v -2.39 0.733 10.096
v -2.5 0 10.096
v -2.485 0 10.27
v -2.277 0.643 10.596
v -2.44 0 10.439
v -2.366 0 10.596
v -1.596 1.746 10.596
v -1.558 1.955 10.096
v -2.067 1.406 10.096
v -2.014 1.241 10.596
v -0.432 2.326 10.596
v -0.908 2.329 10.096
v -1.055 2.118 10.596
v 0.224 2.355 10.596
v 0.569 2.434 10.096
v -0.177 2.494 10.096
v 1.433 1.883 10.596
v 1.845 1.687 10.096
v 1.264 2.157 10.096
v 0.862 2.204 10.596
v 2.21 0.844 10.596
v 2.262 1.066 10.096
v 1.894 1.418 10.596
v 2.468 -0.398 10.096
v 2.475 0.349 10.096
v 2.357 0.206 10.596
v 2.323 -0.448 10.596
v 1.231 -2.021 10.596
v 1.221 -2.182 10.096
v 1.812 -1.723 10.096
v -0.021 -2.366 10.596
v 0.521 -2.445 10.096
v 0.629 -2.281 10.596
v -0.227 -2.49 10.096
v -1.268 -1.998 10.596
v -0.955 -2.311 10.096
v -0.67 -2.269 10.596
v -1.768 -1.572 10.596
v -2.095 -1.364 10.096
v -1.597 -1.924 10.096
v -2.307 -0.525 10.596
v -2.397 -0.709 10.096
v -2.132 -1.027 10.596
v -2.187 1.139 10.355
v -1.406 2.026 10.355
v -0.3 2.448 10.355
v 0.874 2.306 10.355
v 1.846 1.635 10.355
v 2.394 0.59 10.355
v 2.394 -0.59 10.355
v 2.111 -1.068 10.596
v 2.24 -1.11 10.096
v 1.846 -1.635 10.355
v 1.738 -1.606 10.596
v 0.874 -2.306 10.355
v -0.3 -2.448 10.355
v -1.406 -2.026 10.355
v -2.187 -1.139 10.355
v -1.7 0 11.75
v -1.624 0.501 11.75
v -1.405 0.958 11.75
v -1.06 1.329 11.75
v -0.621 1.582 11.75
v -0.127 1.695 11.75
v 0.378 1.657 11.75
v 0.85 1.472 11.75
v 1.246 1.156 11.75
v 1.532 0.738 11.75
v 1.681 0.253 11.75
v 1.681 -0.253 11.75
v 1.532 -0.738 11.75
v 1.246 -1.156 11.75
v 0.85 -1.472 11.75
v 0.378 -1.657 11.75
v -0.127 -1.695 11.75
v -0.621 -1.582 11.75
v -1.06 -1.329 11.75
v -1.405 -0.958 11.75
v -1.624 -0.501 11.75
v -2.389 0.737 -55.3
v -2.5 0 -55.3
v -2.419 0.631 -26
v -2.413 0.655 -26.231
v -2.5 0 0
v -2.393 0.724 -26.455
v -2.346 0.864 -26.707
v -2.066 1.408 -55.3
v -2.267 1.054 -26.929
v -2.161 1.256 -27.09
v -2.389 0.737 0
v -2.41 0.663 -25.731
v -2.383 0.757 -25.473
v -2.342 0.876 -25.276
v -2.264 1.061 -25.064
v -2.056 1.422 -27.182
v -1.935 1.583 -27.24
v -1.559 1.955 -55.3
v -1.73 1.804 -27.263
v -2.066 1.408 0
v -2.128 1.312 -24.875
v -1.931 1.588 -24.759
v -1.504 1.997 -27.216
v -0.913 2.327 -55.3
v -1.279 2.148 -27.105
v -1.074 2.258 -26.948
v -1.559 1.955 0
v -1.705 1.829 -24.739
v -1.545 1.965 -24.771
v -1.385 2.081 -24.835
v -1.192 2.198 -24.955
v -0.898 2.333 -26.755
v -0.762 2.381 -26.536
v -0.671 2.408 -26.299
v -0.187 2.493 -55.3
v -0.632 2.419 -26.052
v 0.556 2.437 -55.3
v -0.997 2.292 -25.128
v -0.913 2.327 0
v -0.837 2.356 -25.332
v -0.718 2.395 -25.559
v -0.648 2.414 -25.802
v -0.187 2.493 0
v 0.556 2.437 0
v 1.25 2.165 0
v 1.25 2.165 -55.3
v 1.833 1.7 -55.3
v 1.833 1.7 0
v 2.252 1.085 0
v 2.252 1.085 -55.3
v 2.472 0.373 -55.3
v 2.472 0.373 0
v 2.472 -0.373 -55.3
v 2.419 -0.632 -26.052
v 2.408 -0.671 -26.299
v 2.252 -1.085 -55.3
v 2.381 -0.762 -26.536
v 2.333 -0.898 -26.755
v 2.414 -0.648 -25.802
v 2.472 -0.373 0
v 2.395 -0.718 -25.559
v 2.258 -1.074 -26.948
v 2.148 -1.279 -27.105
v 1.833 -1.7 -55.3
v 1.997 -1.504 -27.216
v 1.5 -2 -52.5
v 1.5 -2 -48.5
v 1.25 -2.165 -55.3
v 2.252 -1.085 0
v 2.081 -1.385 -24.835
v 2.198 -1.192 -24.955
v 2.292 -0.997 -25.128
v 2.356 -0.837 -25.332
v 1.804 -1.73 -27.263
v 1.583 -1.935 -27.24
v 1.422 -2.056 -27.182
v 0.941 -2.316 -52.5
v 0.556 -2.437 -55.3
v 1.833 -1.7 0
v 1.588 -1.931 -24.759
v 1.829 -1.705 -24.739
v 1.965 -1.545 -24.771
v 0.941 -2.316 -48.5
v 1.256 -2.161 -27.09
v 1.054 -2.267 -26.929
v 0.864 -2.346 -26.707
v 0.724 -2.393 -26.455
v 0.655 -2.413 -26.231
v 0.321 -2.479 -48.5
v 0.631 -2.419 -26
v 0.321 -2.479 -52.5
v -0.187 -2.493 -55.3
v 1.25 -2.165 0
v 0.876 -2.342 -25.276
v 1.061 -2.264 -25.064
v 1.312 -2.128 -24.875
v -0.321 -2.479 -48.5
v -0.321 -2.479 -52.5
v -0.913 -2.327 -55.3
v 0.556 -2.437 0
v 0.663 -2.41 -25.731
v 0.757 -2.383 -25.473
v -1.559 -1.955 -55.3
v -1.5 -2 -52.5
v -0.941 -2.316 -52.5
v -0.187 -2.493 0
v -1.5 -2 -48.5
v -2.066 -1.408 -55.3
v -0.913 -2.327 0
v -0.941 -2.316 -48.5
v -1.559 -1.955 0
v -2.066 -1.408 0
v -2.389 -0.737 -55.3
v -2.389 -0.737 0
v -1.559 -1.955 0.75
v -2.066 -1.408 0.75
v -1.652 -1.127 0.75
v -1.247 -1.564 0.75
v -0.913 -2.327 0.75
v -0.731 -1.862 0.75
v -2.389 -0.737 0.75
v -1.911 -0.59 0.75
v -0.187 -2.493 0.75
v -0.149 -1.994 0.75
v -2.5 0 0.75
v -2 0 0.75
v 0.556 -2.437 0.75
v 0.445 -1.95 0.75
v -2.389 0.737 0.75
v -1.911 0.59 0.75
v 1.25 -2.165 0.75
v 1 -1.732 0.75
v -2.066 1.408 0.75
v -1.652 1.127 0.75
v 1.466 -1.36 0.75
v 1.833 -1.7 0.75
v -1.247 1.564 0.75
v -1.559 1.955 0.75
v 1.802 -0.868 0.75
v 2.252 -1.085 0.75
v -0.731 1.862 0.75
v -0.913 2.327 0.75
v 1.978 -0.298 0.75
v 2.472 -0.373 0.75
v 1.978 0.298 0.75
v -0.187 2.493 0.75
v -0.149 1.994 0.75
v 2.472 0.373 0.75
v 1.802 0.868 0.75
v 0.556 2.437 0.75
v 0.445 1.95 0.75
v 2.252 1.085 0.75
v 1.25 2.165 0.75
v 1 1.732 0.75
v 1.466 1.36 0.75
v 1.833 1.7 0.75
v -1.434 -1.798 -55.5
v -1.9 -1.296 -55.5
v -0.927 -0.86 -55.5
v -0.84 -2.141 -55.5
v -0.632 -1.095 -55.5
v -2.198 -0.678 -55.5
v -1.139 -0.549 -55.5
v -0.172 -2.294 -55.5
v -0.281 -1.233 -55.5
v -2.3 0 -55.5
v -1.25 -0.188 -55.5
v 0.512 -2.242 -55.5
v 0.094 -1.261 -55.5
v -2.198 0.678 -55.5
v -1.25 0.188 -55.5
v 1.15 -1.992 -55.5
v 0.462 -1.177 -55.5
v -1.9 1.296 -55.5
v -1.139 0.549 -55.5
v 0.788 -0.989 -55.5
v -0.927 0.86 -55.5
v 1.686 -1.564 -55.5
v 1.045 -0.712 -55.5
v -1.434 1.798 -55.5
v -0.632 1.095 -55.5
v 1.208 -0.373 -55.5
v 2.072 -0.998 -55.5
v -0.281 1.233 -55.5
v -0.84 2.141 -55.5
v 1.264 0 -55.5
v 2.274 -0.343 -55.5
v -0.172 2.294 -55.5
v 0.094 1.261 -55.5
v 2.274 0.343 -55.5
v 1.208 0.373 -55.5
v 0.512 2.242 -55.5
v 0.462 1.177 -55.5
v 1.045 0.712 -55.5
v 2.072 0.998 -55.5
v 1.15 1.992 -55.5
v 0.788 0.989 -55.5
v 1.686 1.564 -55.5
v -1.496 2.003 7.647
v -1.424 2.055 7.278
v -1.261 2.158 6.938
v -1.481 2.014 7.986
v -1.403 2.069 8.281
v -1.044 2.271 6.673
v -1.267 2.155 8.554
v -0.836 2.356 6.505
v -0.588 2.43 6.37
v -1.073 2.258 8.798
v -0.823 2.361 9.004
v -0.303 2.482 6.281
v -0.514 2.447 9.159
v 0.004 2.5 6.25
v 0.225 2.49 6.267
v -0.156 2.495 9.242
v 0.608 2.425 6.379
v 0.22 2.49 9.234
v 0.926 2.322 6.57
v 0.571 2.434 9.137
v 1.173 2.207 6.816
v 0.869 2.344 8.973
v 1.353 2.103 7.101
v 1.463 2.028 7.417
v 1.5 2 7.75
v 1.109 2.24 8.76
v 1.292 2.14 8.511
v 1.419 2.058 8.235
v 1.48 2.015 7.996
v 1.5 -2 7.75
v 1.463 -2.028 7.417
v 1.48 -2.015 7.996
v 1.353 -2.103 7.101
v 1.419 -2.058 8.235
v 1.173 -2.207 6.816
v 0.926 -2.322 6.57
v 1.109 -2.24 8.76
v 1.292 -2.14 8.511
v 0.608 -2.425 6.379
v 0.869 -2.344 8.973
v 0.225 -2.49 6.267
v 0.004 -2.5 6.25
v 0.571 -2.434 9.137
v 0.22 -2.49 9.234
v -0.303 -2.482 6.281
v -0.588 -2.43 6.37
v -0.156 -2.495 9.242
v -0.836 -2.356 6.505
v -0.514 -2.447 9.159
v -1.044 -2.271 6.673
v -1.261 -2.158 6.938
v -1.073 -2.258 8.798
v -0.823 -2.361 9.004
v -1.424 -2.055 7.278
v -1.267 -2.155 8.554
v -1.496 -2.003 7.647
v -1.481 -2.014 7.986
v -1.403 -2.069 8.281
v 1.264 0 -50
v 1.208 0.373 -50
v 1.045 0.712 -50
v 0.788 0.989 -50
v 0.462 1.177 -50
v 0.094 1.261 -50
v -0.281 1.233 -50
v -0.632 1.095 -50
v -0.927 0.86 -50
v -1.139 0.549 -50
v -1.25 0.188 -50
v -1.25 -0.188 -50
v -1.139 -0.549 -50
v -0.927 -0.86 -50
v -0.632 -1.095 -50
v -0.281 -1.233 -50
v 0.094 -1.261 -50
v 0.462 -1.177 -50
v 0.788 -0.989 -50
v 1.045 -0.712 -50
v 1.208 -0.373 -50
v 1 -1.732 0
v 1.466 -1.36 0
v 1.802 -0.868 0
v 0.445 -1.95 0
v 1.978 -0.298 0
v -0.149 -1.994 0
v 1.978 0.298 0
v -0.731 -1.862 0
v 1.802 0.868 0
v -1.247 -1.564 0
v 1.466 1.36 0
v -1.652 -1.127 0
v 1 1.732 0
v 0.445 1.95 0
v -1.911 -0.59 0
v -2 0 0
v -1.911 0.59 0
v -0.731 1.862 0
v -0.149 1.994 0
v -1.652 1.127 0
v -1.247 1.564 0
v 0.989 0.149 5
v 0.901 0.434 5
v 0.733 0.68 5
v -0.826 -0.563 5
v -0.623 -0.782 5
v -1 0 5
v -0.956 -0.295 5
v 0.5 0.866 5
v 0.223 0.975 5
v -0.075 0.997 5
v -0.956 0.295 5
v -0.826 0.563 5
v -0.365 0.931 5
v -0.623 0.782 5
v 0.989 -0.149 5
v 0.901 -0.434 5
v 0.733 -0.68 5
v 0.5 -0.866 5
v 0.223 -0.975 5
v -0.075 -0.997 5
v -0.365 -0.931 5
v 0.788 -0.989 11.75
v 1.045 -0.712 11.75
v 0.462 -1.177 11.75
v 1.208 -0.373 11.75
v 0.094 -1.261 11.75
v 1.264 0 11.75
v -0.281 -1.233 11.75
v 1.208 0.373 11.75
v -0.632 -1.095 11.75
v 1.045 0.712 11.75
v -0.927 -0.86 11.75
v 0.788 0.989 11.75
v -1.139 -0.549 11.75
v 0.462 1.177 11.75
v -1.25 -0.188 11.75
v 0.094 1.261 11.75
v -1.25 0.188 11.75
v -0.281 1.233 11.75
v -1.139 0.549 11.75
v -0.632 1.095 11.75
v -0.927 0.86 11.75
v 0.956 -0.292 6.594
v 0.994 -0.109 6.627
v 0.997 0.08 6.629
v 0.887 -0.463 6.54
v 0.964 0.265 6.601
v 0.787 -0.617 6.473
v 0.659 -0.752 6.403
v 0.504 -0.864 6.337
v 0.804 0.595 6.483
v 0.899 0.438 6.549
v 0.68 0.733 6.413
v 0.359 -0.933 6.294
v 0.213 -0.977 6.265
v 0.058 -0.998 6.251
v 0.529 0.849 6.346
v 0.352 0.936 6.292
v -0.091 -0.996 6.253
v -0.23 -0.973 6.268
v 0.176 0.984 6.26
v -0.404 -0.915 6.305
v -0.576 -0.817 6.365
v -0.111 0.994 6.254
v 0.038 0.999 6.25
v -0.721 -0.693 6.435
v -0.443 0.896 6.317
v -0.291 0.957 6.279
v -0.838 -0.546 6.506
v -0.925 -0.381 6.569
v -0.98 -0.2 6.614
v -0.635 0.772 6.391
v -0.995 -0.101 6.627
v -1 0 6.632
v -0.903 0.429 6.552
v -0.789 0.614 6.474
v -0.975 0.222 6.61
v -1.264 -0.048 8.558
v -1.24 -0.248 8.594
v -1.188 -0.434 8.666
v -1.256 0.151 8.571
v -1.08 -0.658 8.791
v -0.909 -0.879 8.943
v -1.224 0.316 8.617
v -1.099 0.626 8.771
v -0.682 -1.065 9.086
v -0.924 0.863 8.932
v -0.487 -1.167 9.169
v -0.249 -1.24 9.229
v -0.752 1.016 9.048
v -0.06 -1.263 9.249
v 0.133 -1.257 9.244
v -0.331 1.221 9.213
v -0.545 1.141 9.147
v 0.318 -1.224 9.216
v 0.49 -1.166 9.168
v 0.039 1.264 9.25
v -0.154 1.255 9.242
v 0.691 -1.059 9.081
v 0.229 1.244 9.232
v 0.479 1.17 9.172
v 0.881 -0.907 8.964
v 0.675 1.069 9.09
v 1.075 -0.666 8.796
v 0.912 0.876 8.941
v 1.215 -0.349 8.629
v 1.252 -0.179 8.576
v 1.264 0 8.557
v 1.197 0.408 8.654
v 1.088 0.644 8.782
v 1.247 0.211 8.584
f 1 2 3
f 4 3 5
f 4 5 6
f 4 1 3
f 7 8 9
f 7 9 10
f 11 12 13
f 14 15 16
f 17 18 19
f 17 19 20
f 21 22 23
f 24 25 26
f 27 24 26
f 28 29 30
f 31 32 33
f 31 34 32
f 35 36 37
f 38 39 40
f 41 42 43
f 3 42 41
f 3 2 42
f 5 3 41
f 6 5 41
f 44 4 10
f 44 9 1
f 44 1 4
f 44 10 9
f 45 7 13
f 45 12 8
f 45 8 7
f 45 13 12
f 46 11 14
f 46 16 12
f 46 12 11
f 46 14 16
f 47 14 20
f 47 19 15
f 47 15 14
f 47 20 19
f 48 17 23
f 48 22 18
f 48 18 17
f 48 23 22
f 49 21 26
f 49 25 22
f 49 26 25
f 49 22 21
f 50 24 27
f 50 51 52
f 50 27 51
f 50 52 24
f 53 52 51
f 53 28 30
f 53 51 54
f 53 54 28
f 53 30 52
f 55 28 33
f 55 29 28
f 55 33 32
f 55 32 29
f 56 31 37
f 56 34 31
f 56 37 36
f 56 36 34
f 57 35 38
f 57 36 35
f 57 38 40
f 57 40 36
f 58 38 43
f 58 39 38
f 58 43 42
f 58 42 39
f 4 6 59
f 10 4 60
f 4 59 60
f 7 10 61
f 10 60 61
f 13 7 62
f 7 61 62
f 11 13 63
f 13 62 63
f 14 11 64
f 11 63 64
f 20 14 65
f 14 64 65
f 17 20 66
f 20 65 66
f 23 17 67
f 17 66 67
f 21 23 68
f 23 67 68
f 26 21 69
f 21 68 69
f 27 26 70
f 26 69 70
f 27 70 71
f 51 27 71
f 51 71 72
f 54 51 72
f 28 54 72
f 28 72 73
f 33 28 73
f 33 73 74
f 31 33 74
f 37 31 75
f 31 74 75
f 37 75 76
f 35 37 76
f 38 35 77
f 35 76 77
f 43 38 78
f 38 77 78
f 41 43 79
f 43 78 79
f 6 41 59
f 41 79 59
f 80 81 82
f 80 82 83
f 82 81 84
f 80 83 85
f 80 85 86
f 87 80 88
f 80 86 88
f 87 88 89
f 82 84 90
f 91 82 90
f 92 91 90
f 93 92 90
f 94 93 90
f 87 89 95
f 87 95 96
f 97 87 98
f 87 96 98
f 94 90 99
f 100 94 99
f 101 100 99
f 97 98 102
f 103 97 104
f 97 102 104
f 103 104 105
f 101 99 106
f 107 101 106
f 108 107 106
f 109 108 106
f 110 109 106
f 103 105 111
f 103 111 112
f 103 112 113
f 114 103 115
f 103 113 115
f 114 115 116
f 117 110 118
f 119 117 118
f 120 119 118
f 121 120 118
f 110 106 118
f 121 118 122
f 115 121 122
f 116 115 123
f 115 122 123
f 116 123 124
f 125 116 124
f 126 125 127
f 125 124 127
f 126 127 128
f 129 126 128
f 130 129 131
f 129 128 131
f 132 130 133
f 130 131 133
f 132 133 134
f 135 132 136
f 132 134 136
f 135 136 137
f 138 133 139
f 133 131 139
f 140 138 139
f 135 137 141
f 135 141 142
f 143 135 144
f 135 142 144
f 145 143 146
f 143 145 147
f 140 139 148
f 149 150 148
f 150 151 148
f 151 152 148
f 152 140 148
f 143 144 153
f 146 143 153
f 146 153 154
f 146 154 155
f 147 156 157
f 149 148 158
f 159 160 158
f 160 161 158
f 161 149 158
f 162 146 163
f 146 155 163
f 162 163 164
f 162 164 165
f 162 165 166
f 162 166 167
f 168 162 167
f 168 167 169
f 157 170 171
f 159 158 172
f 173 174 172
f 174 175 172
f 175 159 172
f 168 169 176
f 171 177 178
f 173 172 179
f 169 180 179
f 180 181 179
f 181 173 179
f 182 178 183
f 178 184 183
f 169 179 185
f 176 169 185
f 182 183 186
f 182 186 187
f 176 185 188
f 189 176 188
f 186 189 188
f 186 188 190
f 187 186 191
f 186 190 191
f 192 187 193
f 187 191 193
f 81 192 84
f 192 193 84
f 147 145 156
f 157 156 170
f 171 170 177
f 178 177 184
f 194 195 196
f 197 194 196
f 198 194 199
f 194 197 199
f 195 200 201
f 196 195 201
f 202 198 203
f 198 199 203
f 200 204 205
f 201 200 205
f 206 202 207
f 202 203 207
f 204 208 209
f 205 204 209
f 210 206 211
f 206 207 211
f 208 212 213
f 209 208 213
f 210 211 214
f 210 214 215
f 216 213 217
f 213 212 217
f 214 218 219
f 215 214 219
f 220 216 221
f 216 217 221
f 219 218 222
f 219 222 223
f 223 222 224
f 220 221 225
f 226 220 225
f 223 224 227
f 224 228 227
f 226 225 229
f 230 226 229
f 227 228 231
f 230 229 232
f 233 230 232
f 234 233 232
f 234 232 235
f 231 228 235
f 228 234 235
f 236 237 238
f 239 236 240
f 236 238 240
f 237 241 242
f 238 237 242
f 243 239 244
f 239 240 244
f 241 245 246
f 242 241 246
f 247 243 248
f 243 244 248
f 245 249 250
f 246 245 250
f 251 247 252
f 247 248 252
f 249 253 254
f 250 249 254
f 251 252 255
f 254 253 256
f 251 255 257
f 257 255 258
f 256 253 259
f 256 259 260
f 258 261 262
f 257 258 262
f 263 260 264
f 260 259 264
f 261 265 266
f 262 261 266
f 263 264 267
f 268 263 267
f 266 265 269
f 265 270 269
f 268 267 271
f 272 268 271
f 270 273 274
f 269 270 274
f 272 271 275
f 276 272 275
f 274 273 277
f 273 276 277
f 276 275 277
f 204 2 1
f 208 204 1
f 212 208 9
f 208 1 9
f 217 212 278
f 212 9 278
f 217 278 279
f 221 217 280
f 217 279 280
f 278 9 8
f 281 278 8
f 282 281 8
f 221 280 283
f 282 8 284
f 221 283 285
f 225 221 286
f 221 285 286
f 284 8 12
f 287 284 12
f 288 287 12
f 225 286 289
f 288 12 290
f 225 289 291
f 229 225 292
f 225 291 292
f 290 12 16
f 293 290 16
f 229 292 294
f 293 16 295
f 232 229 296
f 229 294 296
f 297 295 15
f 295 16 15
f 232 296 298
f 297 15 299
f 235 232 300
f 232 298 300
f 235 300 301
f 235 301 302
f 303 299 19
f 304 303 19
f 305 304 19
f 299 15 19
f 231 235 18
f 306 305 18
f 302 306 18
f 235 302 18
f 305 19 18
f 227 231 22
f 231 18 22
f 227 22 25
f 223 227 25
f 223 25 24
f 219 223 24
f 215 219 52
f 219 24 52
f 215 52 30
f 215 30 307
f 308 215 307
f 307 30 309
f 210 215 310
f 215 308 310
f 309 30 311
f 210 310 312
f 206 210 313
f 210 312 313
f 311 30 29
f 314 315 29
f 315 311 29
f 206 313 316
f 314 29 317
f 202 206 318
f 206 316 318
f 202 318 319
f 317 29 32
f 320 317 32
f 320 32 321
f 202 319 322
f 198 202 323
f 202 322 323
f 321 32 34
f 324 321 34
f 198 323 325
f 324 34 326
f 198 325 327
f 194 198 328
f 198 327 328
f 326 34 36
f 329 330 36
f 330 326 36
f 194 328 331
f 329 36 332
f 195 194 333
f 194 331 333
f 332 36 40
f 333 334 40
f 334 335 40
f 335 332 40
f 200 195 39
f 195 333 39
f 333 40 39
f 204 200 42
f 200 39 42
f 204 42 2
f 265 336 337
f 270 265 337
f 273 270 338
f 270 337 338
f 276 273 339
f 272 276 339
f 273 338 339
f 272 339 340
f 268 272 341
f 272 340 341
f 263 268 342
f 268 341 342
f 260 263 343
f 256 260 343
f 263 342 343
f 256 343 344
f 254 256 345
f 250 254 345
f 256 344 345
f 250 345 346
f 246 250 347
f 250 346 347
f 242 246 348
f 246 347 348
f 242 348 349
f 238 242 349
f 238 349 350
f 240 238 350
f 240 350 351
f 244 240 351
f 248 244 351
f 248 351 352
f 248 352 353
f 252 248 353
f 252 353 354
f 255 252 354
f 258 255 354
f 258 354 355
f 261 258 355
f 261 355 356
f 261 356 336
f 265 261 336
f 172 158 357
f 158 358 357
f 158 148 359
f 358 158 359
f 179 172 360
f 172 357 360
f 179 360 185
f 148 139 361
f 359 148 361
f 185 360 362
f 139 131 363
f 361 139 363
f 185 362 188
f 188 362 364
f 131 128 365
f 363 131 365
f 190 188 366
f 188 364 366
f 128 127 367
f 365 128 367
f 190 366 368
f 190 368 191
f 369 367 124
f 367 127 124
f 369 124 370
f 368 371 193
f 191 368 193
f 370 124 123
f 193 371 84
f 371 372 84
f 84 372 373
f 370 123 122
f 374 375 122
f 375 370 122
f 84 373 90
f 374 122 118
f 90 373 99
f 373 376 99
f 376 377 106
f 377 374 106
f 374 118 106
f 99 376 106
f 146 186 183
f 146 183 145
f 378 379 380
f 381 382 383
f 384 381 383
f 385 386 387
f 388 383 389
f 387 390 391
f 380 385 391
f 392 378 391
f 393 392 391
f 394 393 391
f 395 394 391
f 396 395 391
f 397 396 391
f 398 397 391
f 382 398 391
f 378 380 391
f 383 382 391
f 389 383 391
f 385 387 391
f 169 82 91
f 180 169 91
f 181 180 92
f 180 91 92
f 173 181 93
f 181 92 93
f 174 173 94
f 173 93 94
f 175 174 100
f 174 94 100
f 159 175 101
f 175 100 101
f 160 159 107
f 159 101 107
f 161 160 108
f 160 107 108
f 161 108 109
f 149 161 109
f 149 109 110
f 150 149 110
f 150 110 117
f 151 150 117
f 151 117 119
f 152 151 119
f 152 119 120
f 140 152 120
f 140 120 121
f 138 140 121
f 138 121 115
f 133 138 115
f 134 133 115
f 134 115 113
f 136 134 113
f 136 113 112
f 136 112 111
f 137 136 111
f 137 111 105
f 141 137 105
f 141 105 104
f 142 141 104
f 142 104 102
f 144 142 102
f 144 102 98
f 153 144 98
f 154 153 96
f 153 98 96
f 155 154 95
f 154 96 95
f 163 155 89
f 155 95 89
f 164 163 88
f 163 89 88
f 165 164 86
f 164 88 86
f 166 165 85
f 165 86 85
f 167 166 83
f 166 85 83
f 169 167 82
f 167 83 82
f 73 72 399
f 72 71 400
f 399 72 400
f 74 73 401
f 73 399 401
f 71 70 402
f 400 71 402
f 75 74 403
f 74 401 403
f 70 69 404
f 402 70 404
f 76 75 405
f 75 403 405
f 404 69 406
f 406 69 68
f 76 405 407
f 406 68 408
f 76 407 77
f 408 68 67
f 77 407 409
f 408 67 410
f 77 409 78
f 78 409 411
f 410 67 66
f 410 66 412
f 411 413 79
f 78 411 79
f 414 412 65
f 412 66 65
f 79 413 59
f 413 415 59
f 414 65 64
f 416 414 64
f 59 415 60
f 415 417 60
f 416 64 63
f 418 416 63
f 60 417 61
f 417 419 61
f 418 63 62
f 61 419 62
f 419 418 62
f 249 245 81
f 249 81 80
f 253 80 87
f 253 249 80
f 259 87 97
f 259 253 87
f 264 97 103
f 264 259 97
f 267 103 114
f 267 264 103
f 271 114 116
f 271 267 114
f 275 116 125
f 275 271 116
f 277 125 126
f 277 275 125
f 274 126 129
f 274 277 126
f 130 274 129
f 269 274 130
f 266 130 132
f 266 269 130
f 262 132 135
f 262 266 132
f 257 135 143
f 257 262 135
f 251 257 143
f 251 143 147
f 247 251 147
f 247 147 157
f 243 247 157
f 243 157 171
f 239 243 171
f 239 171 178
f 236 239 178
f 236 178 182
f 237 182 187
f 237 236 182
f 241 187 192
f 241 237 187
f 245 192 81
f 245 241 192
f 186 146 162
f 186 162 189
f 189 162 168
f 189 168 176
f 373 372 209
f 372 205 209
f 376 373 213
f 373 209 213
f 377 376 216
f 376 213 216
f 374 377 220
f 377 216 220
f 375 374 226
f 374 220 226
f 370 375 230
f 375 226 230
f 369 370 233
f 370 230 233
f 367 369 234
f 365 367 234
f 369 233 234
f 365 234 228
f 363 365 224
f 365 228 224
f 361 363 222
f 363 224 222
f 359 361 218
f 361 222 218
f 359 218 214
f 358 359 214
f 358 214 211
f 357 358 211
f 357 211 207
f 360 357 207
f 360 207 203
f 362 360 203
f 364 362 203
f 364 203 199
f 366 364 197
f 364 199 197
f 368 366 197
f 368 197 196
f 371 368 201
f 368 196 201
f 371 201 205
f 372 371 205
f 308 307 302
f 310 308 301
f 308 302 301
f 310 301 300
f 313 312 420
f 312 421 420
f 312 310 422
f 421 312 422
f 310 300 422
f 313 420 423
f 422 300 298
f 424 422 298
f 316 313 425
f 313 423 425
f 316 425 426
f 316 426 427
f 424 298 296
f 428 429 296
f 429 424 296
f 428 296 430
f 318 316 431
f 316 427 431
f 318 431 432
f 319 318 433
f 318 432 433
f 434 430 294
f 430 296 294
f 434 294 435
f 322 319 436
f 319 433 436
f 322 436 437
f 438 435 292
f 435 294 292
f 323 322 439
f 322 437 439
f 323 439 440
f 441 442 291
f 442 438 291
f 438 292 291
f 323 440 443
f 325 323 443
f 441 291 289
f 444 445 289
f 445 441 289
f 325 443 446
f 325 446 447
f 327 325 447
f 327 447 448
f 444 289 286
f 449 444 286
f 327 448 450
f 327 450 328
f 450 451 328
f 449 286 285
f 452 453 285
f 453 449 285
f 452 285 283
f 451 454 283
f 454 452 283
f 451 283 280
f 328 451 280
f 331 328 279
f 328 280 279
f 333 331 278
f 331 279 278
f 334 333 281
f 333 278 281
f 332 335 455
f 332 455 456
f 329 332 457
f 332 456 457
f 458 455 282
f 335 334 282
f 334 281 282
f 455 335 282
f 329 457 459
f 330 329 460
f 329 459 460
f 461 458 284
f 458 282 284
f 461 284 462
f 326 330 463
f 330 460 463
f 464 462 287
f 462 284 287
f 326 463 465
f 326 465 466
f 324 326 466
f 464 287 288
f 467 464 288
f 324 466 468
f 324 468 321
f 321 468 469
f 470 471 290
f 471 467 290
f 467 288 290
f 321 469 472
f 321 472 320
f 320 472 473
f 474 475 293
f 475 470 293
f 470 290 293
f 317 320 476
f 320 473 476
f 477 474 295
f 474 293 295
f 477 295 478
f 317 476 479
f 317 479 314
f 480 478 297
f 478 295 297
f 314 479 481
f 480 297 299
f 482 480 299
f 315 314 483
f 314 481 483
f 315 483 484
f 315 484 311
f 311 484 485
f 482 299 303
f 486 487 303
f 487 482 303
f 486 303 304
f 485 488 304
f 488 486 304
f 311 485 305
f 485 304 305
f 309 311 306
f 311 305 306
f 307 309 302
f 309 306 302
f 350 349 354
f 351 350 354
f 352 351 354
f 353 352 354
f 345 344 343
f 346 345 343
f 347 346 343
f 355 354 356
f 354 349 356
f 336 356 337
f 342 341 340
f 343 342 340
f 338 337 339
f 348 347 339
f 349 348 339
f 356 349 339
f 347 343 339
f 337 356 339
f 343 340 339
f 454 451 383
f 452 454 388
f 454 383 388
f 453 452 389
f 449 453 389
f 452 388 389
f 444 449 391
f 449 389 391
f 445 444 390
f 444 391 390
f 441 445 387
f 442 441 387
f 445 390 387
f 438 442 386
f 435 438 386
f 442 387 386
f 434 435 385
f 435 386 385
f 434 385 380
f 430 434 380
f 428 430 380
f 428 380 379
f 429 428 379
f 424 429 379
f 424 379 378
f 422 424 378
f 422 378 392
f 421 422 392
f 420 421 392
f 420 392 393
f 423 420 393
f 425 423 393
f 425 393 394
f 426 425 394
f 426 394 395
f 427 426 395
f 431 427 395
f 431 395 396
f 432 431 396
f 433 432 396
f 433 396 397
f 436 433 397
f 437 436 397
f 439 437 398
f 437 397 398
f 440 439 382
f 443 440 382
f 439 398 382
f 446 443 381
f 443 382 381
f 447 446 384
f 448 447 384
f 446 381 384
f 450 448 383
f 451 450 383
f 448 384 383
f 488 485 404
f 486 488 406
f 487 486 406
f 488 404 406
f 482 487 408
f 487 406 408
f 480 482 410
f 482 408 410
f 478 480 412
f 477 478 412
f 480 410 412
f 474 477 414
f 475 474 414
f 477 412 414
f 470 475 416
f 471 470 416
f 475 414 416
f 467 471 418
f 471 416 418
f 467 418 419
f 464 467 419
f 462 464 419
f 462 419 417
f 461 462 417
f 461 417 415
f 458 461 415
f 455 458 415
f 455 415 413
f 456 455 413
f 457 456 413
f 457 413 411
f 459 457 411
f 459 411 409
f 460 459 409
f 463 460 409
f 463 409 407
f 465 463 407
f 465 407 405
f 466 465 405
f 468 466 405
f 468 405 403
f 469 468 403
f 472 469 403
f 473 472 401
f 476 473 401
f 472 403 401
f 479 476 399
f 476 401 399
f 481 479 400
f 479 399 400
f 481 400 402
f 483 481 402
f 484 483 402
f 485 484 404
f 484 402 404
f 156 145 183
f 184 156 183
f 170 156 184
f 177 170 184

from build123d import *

# Parameters (mm, degrees)
CUT_EXTRUDE1_START           = -4
CUT_EXTRUDE1_DEPTH           = 4
F_3_0_3_DIAMETER_HOLE1_D     = 3
M2_CLEARANCE_HOLE1_REACH     = 69.343
M2_CLEARANCE_HOLE1_BORE_R    = 1.2645
F_2_0_2_DIAMETER_HOLE1_D     = 2
F_2_0_2_DIAMETER_HOLE1_DEPTH = 1.631966011
M2_CLEARANCE_HOLE2_D         = 2.529
M2_CLEARANCE_HOLE2_DEPTH     = 5.5
M2_CLEARANCE_HOLE3_D         = 2.529
M2_CLEARANCE_HOLE3_DEPTH     = 6.035533906
CHAMFER1_SIZE                = 0.2
FILLET1_R                    = 1


with BuildPart() as part:
    # Sketch1 → Revolve1 (revolve)
    with BuildSketch(Plane.XZ, mode=Mode.PRIVATE) as revolve1_sk:
        Polygon((1.7, 11.75), (0, 11.75), (0, -55.5), (2.5, -55.5), (2.5, 0), (2, 0), (2, 0.75), (2.5, 0.75), (2.5, 10.364359354), align=None)
    revolve(revolve1_sk.sketch.rotate(Axis((0, 0, 11.75), (0, 0, -1)), 180), axis=Axis((0, 0, 11.75), (0, 0, -1)))

    # Sketch2 → Cut-Extrude1 (cut)
    with BuildSketch(Plane(origin=(0, 0, -52.5), x_dir=(-1, 0, 0), z_dir=(0, 0, -1)).offset(CUT_EXTRUDE1_START)):
        with BuildLine():
            Line((1.5, -2), (-1.5, -2))
            ThreePointArc((-1.5, -2), (0, -2.5), (1.5, -2))
        make_face()
    extrude(amount=CUT_EXTRUDE1_DEPTH, mode=Mode.SUBTRACT)

    # Ø3.0 (3) Diameter Hole1 (through all)
    with Locations(Plane(origin=(0, -2.5, 7.75), x_dir=(-1, 0, 0), z_dir=(0, -1, 0))):
        with Locations((0, 0)):
            Hole(F_3_0_3_DIAMETER_HOLE1_D / 2)

    # M2 Clearance Hole1 bore → M2 Clearance Hole1 (cut, up to next)
    with BuildSketch(Plane.XY.offset(11.75), mode=Mode.PRIVATE) as m2_clearance_hole1_sk1:
        Circle(M2_CLEARANCE_HOLE1_BORE_R)
    m2_clearance_hole1_tool1 = extrude(m2_clearance_hole1_sk1.sketch, amount=-M2_CLEARANCE_HOLE1_REACH, mode=Mode.PRIVATE) & part.part
    add(m2_clearance_hole1_tool1.solids().sort_by_distance((0, 0, 11.75))[0], mode=Mode.SUBTRACT)

    # Ø2.0 (2) Diameter Hole1
    with Locations(Plane.XY.offset(6.631966011)):
        with Locations((0, 0)):
            Hole(F_2_0_2_DIAMETER_HOLE1_D / 2, depth=F_2_0_2_DIAMETER_HOLE1_DEPTH)

    # M2 Clearance Hole2
    with Locations(Plane(origin=(0, 0, -55.5), x_dir=(-1, 0, 0), z_dir=(0, 0, -1))):
        with Locations((0, 0)):
            Hole(M2_CLEARANCE_HOLE2_D / 2, depth=M2_CLEARANCE_HOLE2_DEPTH)

    # M2 Clearance Hole3
    with Locations(Plane(origin=(1.767766953, -1.767766953, -26), x_dir=(0.707106781187, 0.707106781187, 0), z_dir=(0.707106781187, -0.707106781187, 0))):
        with Locations((0, 0)):
            Hole(M2_CLEARANCE_HOLE3_D / 2, depth=M2_CLEARANCE_HOLE3_DEPTH)

    # Chamfer1
    chamfer1_edges = [part.edges().sort_by_distance(p)[0] for p in [
        (2.5, 0, -55.5),
    ]]
    chamfer(chamfer1_edges, length=CHAMFER1_SIZE)

    # Fillet1
    fillet1_edges = [part.edges().sort_by_distance(p)[0] for p in [
        (2.5, 0, 10.364359354),
    ]]
    fillet(fillet1_edges, radius=FILLET1_R)


solid = part.part
